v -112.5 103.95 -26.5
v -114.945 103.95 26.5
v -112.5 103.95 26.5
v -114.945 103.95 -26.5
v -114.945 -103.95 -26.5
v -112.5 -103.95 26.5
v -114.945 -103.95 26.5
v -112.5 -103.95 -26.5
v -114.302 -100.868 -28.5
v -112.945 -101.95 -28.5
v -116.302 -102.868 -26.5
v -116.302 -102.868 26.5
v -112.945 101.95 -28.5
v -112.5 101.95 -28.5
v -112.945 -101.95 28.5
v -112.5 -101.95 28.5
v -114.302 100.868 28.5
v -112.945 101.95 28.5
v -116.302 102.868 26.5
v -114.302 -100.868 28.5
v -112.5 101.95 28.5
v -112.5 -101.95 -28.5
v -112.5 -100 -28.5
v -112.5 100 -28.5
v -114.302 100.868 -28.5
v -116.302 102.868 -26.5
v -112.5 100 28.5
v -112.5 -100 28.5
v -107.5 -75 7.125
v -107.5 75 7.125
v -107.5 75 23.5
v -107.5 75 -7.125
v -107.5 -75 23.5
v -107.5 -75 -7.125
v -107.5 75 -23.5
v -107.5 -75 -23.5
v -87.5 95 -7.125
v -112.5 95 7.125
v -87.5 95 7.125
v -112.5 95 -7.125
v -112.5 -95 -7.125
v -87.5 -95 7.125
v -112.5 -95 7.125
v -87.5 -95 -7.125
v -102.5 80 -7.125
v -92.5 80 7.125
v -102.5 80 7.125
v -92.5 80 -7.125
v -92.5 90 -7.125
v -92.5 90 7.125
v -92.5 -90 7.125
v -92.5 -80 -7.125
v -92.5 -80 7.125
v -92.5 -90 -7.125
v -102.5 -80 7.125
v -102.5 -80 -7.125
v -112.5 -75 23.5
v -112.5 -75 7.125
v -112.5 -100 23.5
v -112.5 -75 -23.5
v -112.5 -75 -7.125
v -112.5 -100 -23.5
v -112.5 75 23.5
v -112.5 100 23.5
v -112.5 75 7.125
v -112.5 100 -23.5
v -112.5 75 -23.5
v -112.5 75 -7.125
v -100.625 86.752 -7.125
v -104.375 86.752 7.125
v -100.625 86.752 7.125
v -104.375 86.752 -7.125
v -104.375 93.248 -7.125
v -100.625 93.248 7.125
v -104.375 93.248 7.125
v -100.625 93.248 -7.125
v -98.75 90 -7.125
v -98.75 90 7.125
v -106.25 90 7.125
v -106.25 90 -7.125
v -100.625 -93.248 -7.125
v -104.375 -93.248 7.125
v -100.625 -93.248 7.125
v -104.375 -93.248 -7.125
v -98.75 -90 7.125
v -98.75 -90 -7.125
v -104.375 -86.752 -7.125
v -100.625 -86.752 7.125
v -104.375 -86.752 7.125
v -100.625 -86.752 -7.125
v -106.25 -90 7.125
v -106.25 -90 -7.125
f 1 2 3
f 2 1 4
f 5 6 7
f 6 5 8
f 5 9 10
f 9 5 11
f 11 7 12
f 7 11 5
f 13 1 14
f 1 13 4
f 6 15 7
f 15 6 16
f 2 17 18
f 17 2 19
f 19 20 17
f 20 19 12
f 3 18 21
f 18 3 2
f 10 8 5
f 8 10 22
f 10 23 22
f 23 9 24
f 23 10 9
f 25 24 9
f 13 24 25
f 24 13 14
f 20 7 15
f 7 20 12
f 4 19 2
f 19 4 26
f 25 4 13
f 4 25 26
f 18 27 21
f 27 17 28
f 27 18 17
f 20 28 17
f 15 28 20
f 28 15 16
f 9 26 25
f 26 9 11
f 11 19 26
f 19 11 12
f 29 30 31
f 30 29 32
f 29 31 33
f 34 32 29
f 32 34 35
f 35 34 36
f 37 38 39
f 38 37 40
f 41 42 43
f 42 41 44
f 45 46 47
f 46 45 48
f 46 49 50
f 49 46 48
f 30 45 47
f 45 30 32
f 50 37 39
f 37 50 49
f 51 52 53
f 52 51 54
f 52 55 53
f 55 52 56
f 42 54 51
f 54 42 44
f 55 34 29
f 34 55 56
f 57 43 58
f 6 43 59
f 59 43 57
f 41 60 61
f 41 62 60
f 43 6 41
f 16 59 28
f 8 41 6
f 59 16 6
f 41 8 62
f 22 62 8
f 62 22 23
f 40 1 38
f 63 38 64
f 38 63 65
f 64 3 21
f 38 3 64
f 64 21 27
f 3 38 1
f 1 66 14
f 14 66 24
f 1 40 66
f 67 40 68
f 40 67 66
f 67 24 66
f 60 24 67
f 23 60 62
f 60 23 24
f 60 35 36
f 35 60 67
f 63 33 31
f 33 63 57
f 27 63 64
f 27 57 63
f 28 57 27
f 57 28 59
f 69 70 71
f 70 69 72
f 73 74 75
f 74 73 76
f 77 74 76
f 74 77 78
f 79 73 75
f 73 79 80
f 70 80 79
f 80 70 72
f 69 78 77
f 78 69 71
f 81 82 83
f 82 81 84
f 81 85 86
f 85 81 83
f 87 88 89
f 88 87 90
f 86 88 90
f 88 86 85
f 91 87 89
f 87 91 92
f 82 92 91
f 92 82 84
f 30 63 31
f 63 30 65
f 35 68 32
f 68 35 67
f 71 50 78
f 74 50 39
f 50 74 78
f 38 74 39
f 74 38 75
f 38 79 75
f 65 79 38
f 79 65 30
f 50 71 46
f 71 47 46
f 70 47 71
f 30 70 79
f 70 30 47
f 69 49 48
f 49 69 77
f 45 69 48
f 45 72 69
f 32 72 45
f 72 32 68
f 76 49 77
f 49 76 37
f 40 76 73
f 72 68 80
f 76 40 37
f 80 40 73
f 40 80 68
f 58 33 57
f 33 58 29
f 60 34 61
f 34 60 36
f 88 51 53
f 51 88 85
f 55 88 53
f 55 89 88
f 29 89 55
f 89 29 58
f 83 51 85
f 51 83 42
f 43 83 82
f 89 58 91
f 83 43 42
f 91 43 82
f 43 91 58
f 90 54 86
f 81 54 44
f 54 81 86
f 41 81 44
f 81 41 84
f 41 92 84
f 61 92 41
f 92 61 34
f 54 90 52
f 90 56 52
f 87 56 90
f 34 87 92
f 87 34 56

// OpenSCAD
// file: frame-left.scad
/*
 * SPDX-FileCopyrightText: © 2023 Brian S. Stephan <bss@incorporeal.org>
 * SPDX-License-Identifier: GPL-3.0-or-later
 */

include <parameters.scad>
include <components.scad>

module base_left_frame(lower=false) {
	difference() {
		frame(lower=lower);
		// chop the right edge off
		side_chopper();
	}
}

module left_frame(lower=false) {
	difference() {
		base_left_frame(lower=lower);
		// connection holes to other frames
		frame_connection_holes();

		// cable routing hole
		frame_cable_routing_hole();

		// aux button holes
		translate([-35, 101.5, 0]) rotate([270, 0, 0]) aux_control_three_button_cluster();
		translate([-35, (frame_y/2)-neutrik_panel_thickness-4, 0]) frame_cutout();
		translate([-72, (frame_y/2)-neutrik_panel_thickness-4, 0]) frame_cutout();
		translate([2, (frame_y/2)-neutrik_panel_thickness-4, 0]) frame_cutout();

		// neutrix button hole
		translate([frame_center_to_neutrik, (frame_y/2)-neutrik_panel_thickness, 0])
			rotate([90, 0, 0]) neutrik_d_mount();
		translate([frame_center_to_neutrik, (frame_y/2)-neutrik_panel_thickness-4, 0])
			frame_cutout();
	}
}

left_frame();
// file: frame-piece-bottom-left-or-right.scad
/*
 * SPDX-FileCopyrightText: © 2024 Brian S. Stephan <bss@incorporeal.org>
 * SPDX-License-Identifier: GPL-3.0-or-later
 */

include <parameters.scad>
include <components.scad>
use <frame-left.scad>

module bottom_left_or_right_frame_piece(lower=false) {
	piece_width = panel_support_width+frame_wall+frame_mount_column_width;
	intersection() {
		left_frame(lower=lower);
		difference() {
			// include the whole bottom wall (including mount columns)
			translate([0, -(frame_y/2)+(piece_width/2), 0]) cube([frame_x, piece_width, frame_z], center=true);
			// ...minus the frame wall and lip on the left
			translate([-frame_x/2+frame_wall/2, 0, 0])
				cube([frame_wall, frame_y, frame_z], center=true);
			// ...minus a slot for the combining piece to go into
			cube([frame_x, frame_y-(panel_support_width+frame_wall)*2, frame_z/4], center=true);
		}
	}
}

bottom_left_or_right_frame_piece();
// file: frame-piece-top-left-or-right.scad
/*
 * SPDX-FileCopyrightText: © 2024 Brian S. Stephan <bss@incorporeal.org>
 * SPDX-License-Identifier: GPL-3.0-or-later
 */

include <parameters.scad>
include <components.scad>
use <frame-left.scad>

module top_left_or_right_frame_piece() {
    piece_width = panel_support_width+frame_wall+frame_mount_column_width;

	intersection() {
		left_frame();
		difference() {
			// include the whole top wall (including mount columns)
			translate([0, (frame_y/2)-(piece_width/2), 0]) cube([frame_x, piece_width, frame_z], center=true);
			// ...minus the frame wall and lip on the left
			translate([-frame_x/2+frame_wall/2, 0, 0])
				cube([frame_wall, frame_y, frame_z], center=true);
			// ...minus a slot for the combining piece to go into
			cube([frame_x, frame_y-(panel_support_width+frame_wall)*2, frame_z/4], center=true);
		}
	}
}

top_left_or_right_frame_piece();
// file: parameters.scad
/*
 * SPDX-FileCopyrightText: © 2023 Brian S. Stephan <bss@incorporeal.org>
 * SPDX-License-Identifier: GPL-3.0-or-later
 */

// adjustments
hole_tolerance = 0.15;

// M2
m2_screw_selftap_radius = 0.95;

// M3
m3_screw_selftap_radius = 1.3;

// M4
m4_bolt_radius = 2 + hole_tolerance;
m4_bolt_countersink_radius = 6.1 + hole_tolerance;
m4_bolt_hex_exterior_radius = 3.6 + hole_tolerance;

// 24mm button
small_button_radius = 12 + hole_tolerance;

// 30mm button
big_button_radius = 15 + hole_tolerance;

// JLF mount dimensions
lever_mount_x = 53;
lever_mount_y = 95;
lever_mount_z = 2;

// standard lever hole
lever_plate_hole = 12;

// korean lever hole
korean_lever_plate_hole = 17.6;

// case dimensions
// base frame box. reminder: top of inside (including mounts) is chopped by panel_z for plates
frame_x = 233;
frame_y = 208;
frame_z = 57;

// degree to which the extended frame pieces stick out from the end of the frame
frame_extension_x = 25;
frame_extension_y = 25;

// this sinks the bottom and top of the frame inward a bit, and is used to math out two shapes
// when creating the frame box / overhang panel
frame_bevel_height = 2;
overhang_panel_bevel_height = 1;

frame_center_to_neutrik = 70;

// depth of the "lip" of the frame that the top plate sets into/supports the overhang
frame_wall = 4;

// width of the column in the frame corners to support the hex bolt
frame_mount_column_width = 20;

// per neutrik (mm)
neutrik_panel_thickness = 3;

// top plate, which can either be the whole plate ("inset") or the mounting frame for a plate that overhangs
panel_x = frame_x - (frame_wall * 2);
panel_y = frame_y - (frame_wall * 2);
panel_z = 5;

// how much the top plate x/y is expanded to overhang the frame
// note that this is relative to the top plate (so the wall is added back)
panel_overhang_amount = 8.5;
overhang_panel_x = panel_x + (frame_wall * 2) + (panel_overhang_amount * 2);
overhang_panel_y = panel_y + (frame_wall * 2) + (panel_overhang_amount * 2);

panel_to_frame_point_x = (panel_x/2)-10;
panel_to_frame_point_y = (panel_y/2)-10;

// frame interior that supports the top plates
panel_support_width = 5;

// neutrik D screw holes
neutrik_d_screw_radius = 1.6 + hole_tolerance;
neutrik_d_radius = 12 + hole_tolerance;

// additional button radius for decorative panels, etc.
decorative_radius_scale = 1.75;
jumbo_decorative_radius_scale = 2;
// main file
/*
 * SPDX-FileCopyrightText: © 2024 Brian S. Stephan <bss@incorporeal.org>
 * SPDX-License-Identifier: GPL-3.0-or-later
 */

include <parameters.scad>
include <components.scad>
use <frame-piece-top-left-or-right.scad>
use <frame-piece-bottom-left-or-right.scad>

module side_frame_piece(lower=false) {
	piece_width = panel_support_width+frame_wall+frame_mount_column_width;
	difference() {
		// side piece is left/right agnostic
        frame(lower=lower);
		// minus the top and bottom
		top_left_or_right_frame_piece();
		bottom_left_or_right_frame_piece();
		// and just chop out the rest of the frame
		translate([piece_width, 0, 0]) cube([frame_x, frame_y+1, frame_z+1], center=true);
	}
}

side_frame_piece();
